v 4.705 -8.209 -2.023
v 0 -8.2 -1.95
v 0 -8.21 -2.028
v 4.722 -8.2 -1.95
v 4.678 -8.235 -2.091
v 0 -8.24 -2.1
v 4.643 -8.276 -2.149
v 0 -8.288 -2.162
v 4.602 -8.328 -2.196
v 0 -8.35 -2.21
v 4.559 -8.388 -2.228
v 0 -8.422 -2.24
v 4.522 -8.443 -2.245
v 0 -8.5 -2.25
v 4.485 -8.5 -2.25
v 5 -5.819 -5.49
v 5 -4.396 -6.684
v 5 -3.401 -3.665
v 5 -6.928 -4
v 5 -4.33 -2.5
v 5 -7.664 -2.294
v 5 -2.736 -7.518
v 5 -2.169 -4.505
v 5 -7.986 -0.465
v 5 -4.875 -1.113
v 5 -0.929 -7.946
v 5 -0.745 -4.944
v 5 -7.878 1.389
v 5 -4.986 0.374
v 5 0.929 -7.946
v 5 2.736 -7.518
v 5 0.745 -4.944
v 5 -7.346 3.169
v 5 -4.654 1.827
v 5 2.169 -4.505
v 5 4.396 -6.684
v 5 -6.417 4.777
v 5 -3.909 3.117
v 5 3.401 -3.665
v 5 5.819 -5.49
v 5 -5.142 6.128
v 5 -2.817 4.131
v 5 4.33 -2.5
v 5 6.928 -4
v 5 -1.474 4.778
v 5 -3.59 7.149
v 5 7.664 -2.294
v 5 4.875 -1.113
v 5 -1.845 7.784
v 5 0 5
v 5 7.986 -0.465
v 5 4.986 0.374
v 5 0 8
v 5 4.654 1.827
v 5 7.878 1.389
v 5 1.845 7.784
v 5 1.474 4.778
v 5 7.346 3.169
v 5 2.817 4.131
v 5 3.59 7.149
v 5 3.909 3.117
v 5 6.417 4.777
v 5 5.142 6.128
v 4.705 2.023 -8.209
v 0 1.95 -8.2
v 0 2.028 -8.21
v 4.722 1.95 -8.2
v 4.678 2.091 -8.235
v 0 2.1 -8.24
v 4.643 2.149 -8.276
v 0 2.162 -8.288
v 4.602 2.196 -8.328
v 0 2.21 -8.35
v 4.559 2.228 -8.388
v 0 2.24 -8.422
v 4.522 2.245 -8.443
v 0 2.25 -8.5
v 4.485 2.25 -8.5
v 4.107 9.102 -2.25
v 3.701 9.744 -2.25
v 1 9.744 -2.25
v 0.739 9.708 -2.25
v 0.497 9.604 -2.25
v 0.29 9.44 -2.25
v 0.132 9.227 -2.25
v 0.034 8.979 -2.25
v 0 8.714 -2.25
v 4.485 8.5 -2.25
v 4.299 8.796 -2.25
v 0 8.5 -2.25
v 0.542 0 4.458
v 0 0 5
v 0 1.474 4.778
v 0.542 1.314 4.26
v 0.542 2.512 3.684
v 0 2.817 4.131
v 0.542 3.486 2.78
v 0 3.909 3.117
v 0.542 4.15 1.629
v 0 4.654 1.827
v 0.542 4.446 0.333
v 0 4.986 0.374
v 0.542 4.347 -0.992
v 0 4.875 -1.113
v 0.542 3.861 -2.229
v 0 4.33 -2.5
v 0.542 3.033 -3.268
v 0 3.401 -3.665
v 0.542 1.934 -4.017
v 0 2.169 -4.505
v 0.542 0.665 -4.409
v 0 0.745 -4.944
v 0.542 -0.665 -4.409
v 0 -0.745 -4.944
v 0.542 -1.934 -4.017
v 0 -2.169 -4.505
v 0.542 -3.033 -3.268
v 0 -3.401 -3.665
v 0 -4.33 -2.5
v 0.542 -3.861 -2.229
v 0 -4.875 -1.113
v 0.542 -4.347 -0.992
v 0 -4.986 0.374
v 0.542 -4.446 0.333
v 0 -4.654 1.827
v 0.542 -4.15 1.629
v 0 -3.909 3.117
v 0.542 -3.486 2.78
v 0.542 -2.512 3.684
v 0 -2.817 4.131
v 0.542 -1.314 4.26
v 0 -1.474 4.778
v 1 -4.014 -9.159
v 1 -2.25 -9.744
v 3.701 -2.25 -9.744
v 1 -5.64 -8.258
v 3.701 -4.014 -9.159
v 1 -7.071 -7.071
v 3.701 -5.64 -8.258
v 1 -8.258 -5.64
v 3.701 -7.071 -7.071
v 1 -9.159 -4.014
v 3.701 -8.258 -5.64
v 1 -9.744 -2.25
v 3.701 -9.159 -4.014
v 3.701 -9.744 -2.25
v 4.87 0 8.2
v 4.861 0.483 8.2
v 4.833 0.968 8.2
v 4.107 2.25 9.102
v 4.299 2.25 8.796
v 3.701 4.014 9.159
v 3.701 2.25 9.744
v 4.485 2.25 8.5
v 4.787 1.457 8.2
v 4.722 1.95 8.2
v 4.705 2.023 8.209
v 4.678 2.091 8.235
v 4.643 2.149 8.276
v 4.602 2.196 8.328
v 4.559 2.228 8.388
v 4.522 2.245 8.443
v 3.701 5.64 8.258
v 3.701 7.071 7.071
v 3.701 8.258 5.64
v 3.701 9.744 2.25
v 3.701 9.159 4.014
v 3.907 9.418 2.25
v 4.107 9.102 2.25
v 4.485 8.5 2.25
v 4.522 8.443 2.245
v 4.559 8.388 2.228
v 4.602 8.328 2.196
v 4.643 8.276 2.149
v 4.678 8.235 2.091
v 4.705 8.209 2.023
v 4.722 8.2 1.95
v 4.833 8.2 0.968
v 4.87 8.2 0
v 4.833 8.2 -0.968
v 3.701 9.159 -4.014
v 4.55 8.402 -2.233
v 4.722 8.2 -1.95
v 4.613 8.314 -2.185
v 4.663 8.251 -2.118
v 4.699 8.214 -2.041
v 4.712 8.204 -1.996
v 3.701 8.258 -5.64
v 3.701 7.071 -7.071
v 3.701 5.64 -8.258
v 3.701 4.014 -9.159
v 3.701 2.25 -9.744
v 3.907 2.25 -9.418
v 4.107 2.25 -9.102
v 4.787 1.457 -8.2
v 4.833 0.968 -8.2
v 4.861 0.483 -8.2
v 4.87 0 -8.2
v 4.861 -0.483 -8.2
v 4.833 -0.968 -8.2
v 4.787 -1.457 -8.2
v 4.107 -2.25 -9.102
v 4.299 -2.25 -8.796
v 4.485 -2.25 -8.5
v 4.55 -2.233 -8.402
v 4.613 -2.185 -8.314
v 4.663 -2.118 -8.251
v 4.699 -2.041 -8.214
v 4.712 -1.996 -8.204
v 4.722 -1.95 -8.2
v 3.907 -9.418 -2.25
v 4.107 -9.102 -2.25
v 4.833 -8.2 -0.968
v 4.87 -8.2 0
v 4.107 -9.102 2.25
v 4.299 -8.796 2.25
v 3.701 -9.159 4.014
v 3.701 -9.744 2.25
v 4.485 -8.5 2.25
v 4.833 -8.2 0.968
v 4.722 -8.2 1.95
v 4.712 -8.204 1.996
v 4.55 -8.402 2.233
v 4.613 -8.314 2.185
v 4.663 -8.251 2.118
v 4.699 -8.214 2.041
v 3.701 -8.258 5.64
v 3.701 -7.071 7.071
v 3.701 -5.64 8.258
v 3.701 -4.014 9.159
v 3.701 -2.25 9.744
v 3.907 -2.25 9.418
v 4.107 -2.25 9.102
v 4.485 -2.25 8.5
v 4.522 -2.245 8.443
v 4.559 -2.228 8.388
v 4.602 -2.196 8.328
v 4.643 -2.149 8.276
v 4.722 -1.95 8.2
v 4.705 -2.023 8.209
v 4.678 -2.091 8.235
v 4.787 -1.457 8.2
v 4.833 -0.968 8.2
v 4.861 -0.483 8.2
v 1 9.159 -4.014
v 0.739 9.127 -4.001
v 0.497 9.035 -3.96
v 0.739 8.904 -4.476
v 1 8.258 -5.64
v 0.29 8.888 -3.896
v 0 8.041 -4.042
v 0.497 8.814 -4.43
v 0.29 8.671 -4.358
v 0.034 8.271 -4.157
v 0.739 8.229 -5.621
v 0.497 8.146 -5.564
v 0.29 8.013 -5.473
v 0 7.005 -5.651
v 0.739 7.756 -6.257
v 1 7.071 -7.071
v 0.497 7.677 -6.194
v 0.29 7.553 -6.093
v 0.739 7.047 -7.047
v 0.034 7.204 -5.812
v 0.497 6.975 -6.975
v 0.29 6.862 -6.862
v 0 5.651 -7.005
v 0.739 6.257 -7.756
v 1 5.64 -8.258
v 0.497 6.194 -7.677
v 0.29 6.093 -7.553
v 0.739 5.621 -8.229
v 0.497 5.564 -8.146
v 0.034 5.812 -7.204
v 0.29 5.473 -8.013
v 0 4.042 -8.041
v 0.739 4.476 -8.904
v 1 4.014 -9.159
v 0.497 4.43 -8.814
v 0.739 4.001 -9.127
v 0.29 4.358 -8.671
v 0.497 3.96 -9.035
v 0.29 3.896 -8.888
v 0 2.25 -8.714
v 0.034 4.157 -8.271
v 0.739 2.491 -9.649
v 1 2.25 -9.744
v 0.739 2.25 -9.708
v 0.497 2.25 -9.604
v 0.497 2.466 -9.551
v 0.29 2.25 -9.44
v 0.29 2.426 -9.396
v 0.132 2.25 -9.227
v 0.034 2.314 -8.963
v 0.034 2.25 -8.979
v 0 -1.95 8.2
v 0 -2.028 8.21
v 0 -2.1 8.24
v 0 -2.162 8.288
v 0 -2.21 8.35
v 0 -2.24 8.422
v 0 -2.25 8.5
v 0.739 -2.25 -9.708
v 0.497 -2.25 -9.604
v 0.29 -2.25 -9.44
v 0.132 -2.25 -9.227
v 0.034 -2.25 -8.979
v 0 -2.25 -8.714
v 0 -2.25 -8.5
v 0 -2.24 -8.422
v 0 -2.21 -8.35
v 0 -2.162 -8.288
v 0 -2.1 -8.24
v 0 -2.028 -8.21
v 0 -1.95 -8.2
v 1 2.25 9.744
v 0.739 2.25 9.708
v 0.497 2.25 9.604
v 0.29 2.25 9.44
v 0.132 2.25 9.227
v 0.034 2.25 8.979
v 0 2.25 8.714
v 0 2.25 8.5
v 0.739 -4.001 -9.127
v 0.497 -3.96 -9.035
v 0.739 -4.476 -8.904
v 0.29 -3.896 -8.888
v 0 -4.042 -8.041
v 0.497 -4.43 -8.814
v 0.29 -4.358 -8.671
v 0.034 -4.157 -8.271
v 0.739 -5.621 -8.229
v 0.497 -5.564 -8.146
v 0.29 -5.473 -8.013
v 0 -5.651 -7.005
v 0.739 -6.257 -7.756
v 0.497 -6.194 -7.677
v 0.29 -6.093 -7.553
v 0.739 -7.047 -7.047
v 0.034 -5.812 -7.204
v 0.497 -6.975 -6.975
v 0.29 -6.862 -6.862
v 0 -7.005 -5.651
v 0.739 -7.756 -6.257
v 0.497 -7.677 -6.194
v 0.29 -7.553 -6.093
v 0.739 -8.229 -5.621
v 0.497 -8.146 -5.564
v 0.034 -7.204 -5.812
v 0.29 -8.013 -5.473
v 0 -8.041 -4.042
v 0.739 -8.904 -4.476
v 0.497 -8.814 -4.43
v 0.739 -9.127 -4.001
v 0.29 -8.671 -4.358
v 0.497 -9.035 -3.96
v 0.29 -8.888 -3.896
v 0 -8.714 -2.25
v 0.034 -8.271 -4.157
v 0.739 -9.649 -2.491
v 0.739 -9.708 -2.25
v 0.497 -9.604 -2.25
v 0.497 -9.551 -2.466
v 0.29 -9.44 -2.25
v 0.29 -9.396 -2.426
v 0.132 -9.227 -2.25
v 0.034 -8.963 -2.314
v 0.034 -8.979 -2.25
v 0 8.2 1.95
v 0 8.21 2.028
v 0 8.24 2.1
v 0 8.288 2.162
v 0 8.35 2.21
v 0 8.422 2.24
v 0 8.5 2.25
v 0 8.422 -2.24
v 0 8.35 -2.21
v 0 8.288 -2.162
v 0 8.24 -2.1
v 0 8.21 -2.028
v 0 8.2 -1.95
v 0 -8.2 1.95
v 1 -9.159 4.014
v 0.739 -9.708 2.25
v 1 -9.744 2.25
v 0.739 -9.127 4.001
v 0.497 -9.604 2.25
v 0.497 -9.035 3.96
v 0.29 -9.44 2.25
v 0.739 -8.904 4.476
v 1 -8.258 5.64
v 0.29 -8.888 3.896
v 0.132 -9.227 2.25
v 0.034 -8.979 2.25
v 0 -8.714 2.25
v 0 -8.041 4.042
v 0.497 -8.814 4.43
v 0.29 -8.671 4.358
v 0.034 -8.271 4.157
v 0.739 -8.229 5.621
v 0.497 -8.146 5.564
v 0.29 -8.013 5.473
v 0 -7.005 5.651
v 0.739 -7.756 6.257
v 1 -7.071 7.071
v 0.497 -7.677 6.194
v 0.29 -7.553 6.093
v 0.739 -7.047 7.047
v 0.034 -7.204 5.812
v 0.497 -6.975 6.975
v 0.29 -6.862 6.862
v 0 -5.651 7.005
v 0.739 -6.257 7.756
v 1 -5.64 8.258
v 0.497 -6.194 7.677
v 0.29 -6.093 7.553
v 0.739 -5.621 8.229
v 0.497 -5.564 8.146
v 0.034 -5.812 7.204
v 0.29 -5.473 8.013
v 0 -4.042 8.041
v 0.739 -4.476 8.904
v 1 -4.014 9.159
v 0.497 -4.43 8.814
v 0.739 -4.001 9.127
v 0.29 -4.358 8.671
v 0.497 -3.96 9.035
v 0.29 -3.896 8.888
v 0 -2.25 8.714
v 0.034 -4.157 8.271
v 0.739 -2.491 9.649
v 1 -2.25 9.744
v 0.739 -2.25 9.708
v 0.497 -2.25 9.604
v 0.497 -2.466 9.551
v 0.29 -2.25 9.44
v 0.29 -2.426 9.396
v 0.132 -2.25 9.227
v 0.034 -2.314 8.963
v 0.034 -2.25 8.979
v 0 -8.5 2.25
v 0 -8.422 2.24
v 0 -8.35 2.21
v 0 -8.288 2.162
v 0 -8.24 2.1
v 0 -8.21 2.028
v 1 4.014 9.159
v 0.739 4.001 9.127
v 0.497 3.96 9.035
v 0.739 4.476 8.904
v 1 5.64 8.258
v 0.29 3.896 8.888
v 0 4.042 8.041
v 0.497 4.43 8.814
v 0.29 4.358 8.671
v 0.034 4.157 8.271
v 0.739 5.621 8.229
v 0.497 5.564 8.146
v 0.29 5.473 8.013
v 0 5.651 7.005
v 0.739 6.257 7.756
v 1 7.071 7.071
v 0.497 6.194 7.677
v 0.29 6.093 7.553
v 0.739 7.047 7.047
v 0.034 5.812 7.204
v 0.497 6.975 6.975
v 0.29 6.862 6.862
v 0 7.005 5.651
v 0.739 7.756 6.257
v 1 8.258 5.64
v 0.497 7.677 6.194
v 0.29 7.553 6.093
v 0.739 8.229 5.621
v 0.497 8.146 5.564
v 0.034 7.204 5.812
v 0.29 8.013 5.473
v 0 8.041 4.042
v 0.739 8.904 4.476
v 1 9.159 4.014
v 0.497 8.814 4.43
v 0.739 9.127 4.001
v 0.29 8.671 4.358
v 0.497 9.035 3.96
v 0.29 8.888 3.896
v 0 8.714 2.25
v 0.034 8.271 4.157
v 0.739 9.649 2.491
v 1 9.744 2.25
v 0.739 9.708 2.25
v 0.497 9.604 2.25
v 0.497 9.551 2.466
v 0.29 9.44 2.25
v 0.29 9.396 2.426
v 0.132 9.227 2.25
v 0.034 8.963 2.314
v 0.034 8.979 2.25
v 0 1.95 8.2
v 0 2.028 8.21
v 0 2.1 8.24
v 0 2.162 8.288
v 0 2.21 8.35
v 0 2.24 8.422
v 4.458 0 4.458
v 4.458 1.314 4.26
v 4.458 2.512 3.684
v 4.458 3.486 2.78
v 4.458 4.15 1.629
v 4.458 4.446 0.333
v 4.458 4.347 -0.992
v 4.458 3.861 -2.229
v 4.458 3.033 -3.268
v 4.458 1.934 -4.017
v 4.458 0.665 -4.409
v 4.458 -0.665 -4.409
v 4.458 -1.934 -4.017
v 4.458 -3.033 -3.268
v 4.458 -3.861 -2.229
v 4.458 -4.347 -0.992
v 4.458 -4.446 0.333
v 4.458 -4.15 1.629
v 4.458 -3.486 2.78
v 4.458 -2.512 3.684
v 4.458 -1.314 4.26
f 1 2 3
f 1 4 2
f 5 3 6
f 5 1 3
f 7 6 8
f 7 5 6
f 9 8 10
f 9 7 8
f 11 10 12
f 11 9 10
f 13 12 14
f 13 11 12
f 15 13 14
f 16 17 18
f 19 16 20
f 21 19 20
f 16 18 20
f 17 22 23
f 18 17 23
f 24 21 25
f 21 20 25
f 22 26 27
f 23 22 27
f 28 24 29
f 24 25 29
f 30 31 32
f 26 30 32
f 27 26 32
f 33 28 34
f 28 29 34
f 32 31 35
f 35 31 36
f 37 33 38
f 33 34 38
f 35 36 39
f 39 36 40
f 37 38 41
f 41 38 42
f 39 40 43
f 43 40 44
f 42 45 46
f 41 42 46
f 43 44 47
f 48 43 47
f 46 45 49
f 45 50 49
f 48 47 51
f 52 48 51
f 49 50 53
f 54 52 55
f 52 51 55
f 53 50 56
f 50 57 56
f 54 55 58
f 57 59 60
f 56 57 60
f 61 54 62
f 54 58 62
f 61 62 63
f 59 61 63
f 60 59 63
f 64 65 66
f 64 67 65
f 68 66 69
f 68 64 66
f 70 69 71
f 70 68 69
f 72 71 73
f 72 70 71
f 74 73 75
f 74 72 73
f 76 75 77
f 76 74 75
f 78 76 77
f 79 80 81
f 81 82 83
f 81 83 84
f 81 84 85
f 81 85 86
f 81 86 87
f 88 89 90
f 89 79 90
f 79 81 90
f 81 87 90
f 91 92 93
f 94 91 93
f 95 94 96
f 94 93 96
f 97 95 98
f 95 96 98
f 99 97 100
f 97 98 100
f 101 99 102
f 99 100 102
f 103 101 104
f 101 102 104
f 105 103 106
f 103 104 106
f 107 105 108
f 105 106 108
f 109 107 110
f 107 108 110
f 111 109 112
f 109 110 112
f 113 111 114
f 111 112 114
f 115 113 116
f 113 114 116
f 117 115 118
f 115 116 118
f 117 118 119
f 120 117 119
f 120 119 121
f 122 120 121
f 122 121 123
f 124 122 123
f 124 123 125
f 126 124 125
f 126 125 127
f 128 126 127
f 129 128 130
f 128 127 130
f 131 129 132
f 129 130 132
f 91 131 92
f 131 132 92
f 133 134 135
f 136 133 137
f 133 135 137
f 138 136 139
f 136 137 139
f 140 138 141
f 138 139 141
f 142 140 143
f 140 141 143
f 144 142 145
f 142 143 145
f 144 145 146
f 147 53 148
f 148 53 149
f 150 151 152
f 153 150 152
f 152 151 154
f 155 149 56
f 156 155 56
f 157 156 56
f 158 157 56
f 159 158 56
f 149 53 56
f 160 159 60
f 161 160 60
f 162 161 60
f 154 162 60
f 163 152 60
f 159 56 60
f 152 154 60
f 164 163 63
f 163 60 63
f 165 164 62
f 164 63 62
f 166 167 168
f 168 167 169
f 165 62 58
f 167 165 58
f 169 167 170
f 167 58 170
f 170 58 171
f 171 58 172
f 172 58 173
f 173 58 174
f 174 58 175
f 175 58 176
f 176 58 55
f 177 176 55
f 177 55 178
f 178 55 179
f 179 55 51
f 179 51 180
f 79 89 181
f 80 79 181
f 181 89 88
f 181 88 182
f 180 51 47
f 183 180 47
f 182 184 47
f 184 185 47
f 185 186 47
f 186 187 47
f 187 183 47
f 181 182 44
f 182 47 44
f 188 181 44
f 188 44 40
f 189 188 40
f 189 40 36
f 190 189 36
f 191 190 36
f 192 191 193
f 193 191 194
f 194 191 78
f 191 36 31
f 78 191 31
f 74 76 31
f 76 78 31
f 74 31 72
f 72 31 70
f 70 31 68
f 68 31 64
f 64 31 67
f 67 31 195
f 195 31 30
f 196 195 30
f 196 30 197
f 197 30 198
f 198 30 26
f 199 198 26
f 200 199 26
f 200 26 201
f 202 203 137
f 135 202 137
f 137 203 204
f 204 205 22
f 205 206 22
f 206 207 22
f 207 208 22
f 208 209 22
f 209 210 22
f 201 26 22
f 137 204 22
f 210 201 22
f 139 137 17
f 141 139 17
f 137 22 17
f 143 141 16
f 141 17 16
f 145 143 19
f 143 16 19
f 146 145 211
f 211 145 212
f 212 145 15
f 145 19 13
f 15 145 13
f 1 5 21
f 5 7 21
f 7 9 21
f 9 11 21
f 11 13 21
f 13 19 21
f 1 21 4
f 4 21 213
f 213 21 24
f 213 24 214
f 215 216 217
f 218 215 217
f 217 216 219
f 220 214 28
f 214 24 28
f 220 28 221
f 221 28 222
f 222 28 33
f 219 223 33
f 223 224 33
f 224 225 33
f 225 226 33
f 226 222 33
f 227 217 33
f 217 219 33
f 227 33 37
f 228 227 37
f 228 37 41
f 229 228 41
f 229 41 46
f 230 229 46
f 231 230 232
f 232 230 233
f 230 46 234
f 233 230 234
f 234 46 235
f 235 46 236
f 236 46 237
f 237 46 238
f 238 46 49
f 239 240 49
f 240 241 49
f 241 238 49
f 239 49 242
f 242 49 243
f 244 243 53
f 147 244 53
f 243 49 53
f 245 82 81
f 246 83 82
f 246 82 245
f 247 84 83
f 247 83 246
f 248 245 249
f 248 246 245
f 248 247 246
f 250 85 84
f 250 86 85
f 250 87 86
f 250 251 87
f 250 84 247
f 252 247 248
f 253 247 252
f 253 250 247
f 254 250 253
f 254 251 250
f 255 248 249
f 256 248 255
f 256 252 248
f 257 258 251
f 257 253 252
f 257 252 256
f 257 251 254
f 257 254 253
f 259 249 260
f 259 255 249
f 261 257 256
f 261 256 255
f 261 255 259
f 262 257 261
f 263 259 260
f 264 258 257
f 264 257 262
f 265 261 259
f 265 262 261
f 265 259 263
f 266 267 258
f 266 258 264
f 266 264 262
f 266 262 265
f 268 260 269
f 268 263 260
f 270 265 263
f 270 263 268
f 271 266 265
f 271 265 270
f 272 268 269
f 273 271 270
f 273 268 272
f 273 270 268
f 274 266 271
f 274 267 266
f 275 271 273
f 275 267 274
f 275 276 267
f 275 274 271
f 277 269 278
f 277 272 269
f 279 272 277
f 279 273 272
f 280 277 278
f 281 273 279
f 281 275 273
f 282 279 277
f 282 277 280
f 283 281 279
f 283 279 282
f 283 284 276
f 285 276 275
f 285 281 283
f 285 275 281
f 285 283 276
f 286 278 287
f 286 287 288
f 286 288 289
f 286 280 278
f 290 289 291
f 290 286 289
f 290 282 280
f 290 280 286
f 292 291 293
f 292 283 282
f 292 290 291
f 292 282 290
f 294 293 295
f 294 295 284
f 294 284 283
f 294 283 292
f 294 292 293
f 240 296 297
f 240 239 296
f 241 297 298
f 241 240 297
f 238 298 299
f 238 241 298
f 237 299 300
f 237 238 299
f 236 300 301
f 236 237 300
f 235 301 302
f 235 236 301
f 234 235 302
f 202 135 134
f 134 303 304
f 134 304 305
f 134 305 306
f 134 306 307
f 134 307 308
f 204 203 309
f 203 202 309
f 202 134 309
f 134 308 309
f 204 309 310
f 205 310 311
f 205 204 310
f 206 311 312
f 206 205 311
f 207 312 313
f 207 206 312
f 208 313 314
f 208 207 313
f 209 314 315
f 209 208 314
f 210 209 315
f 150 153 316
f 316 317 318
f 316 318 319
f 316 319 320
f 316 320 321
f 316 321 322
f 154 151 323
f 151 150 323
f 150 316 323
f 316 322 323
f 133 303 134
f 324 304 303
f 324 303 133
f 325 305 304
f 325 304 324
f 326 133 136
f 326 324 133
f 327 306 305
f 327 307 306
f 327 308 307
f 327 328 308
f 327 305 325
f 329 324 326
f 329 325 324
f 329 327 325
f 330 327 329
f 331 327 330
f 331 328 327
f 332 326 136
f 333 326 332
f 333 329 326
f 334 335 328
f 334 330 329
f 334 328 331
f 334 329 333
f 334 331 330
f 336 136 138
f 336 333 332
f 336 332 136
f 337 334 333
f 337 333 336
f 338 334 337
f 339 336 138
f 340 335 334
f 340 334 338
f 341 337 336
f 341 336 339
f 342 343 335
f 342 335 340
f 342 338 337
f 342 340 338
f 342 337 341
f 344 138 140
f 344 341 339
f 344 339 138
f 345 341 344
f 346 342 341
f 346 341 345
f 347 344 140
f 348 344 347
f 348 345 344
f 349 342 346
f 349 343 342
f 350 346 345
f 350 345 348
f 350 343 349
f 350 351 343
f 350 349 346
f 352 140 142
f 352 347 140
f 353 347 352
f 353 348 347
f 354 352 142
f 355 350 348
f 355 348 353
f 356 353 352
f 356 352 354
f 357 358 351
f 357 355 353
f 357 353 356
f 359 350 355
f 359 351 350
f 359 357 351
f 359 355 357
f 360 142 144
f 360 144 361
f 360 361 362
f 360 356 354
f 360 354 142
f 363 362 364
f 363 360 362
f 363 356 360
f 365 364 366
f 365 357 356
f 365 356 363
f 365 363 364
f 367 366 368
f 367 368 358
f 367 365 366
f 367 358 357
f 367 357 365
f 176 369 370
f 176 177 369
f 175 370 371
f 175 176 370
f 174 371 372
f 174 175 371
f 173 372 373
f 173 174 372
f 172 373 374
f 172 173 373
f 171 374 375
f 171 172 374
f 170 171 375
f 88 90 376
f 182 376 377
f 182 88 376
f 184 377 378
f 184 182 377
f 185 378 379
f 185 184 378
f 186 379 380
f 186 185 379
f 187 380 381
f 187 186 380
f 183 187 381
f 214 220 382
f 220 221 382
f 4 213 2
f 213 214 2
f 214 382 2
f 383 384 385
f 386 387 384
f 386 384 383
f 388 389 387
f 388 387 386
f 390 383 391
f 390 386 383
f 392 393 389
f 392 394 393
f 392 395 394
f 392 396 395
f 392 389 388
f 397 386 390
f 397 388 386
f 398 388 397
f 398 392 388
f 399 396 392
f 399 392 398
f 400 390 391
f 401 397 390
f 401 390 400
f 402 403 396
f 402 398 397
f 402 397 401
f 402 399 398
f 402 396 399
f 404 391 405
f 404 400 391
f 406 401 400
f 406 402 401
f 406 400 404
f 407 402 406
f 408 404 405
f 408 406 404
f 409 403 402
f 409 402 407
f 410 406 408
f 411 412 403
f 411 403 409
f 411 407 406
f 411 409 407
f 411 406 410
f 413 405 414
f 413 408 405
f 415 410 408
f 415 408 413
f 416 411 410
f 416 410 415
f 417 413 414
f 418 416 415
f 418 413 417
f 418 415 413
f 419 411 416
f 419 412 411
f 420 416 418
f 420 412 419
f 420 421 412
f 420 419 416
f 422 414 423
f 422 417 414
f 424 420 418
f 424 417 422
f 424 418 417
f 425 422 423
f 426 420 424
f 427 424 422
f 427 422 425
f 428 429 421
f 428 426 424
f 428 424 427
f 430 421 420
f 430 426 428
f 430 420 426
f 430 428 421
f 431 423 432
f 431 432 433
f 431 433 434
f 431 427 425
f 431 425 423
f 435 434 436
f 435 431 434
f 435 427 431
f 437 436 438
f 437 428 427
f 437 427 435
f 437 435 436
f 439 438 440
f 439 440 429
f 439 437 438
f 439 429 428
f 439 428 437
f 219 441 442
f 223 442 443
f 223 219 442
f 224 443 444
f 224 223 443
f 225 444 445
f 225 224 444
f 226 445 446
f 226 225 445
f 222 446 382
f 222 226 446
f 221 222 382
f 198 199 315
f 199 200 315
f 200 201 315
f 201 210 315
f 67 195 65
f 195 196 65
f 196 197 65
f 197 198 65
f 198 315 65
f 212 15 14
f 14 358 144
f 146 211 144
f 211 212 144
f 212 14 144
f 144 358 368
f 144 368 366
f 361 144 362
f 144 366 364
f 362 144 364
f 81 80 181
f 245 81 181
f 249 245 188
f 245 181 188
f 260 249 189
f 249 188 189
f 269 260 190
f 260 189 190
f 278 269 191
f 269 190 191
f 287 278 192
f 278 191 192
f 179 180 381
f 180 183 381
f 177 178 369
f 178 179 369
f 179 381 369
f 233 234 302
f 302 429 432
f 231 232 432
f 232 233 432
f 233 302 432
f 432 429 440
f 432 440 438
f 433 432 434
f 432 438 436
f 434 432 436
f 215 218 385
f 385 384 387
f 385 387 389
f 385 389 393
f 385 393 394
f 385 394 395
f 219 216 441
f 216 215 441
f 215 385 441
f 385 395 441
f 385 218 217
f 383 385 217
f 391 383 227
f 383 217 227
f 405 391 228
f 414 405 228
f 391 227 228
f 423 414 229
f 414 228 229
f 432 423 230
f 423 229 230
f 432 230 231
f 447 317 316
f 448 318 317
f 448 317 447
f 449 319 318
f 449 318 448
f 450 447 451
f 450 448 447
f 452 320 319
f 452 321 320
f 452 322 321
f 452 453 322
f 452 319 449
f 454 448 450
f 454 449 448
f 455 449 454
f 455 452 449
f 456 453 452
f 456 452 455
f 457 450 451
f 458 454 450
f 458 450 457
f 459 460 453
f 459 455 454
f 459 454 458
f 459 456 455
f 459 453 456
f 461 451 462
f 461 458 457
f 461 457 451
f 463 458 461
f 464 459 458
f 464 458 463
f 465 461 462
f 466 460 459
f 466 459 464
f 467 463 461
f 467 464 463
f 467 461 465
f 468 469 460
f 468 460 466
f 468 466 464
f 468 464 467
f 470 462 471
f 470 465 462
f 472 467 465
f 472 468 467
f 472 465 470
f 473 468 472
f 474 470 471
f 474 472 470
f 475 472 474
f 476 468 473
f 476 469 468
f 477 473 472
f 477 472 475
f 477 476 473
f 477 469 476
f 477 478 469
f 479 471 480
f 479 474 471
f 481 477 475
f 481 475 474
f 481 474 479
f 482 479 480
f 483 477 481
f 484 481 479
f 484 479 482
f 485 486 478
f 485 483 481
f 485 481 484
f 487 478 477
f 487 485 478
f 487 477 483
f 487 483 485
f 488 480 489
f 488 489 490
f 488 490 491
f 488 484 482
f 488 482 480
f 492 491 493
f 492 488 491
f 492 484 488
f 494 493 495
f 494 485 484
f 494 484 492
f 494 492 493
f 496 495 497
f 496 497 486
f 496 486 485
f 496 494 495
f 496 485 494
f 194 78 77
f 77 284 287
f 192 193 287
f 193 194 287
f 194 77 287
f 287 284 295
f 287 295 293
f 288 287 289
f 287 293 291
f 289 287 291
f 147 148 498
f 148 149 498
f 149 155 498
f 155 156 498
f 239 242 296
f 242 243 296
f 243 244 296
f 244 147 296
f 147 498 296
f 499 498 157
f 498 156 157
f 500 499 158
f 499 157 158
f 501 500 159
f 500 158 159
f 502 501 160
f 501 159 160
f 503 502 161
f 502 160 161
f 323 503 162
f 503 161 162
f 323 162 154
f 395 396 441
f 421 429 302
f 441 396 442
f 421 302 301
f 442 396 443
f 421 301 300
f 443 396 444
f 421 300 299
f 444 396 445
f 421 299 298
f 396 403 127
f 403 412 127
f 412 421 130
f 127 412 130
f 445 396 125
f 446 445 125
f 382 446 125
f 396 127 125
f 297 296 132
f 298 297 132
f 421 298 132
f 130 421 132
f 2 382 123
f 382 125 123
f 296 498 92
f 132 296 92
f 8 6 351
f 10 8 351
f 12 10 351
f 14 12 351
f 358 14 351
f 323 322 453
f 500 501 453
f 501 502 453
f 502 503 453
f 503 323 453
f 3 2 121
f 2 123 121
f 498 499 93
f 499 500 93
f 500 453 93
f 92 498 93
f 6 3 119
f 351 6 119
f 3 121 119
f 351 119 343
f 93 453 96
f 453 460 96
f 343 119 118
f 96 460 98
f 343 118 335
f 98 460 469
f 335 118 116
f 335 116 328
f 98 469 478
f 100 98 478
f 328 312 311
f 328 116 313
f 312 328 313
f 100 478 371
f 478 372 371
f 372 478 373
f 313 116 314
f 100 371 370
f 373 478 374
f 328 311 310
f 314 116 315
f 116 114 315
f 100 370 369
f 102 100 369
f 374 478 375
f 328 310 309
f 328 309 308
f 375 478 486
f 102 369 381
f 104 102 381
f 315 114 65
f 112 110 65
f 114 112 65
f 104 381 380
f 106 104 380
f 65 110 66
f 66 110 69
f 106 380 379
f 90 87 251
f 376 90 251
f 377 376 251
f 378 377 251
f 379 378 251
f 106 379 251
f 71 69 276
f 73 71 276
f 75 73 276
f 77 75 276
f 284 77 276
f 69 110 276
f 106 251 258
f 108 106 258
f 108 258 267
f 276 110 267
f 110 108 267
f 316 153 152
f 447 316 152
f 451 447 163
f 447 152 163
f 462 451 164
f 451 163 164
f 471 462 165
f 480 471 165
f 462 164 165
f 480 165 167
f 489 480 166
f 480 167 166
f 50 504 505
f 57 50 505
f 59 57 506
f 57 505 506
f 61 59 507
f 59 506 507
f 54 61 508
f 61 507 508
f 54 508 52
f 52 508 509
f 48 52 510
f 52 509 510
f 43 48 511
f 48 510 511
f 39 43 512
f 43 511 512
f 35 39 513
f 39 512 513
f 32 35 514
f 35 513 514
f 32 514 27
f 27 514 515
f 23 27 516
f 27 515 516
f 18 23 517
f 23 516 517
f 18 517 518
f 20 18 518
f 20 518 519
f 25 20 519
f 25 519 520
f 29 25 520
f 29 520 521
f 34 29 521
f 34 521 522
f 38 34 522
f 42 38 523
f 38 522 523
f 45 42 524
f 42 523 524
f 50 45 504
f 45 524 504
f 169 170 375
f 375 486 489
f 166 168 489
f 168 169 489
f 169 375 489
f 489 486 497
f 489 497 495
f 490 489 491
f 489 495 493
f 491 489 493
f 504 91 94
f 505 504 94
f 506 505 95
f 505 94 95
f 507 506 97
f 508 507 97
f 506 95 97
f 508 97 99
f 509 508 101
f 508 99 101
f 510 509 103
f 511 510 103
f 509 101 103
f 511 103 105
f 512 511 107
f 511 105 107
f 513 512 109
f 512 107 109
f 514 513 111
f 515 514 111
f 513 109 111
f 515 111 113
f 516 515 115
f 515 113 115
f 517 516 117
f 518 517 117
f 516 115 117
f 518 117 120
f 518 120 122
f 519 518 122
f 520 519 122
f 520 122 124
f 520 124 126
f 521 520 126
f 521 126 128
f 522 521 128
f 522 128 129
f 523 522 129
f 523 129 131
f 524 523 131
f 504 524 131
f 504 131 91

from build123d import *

# Parameters (mm, degrees)
CUT_EXTRUDE1_REACH   = 17
CUT_EXTRUDE2_REACH   = 17
CUT_EXTRUDE3_REACH   = 17
CUT_EXTRUDE4_REACH   = 16.83
M8_CLEARANCE_HOLE1_D = 8.917
CHAMFER1_SIZE        = 0.5415
FILLET1_R            = 0.3
FILLET2_R            = 1


with BuildPart() as part:
    # Sketch1 → Revolve1 (revolve)
    with BuildSketch(Plane(origin=(0, 0, 0), x_dir=(-1, 0, 0), z_dir=(0, 0, -1)), mode=Mode.PRIVATE) as revolve1_sk:
        Polygon((-5, 8), (-5, 0), (0, 0), (0, 10), (-3.701184814, 10), align=None)
    revolve(revolve1_sk.sketch.rotate(Axis((5, 0, 0), (-1, 0, 0)), 270), axis=Axis((5, 0, 0), (-1, 0, 0)))

    # Cut-Extrude1: up to this cone (the profile starts inside it)
    cut_extrude1_end = Plane(origin=(0, 0, 0), z_dir=(-1, 0, 0)).offset(-10.195259746) * Cone(1.54e-06, 66.821801925, 43.394584565, align=(Align.CENTER, Align.CENTER, Align.MIN), mode=Mode.PRIVATE)
    # Sketch2 → Cut-Extrude1 (cut, up to the surface)
    with BuildSketch(Plane.ZY, mode=Mode.PRIVATE) as cut_extrude1_sk1:
        with BuildLine():
            Line((9.743587635, 2.25), (8.2, 2.25))
            Line((8.2, 2.25), (8.2, -2.25))
            Line((8.2, -2.25), (9.743587635, -2.25))
            ThreePointArc((9.743587635, -2.25), (10, 0), (9.743587635, 2.25))
        make_face()
    cut_extrude1_tool1 = extrude(cut_extrude1_sk1.sketch, amount=-CUT_EXTRUDE1_REACH, mode=Mode.PRIVATE) & cut_extrude1_end
    add(cut_extrude1_tool1.solids().sort_by_distance((0, 0, 9.059184))[0], mode=Mode.SUBTRACT)

    # Cut-Extrude2: up to this cone (the profile starts inside it)
    cut_extrude2_end = Plane(origin=(0, 0, 0), z_dir=(-1, 0, 0)).offset(-10.195259746) * Cone(1.54e-06, 66.821801925, 43.394584565, align=(Align.CENTER, Align.CENTER, Align.MIN), mode=Mode.PRIVATE)
    # Sketch3 → Cut-Extrude2 (cut, up to the surface)
    with BuildSketch(Plane.ZY, mode=Mode.PRIVATE) as cut_extrude2_sk1:
        with BuildLine():
            Line((2.25, -9.743587635), (2.25, -8.2))
            Line((2.25, -8.2), (-2.25, -8.2))
            Line((-2.25, -8.2), (-2.25, -9.743587635))
            ThreePointArc((-2.25, -9.743587635), (0, -10), (2.25, -9.743587635))
        make_face()
    cut_extrude2_tool1 = extrude(cut_extrude2_sk1.sketch, amount=-CUT_EXTRUDE2_REACH, mode=Mode.PRIVATE) & cut_extrude2_end
    add(cut_extrude2_tool1.solids().sort_by_distance((0, -9.059184, 0))[0], mode=Mode.SUBTRACT)

    # Cut-Extrude3: up to this cone (the profile starts inside it)
    cut_extrude3_end = Plane(origin=(0, 0, 0), z_dir=(-1, 0, 0)).offset(-10.195259746) * Cone(1.54e-06, 66.821801925, 43.394584565, align=(Align.CENTER, Align.CENTER, Align.MIN), mode=Mode.PRIVATE)
    # Sketch4 → Cut-Extrude3 (cut, up to the surface)
    with BuildSketch(Plane.ZY, mode=Mode.PRIVATE) as cut_extrude3_sk1:
        with BuildLine():
            Line((-9.743587635, -2.25), (-8.2, -2.25))
            Line((-8.2, -2.25), (-8.2, 2.25))
            Line((-8.2, 2.25), (-9.743587635, 2.25))
            ThreePointArc((-9.743587635, 2.25), (-10, 0), (-9.743587635, -2.25))
        make_face()
    cut_extrude3_tool1 = extrude(cut_extrude3_sk1.sketch, amount=-CUT_EXTRUDE3_REACH, mode=Mode.PRIVATE) & cut_extrude3_end
    add(cut_extrude3_tool1.solids().sort_by_distance((0, 0, -9.059184))[0], mode=Mode.SUBTRACT)

    # Cut-Extrude4: up to this cone (the profile starts inside it)
    cut_extrude4_end = Plane(origin=(0, 0, 0), z_dir=(-1, 0, 0)).offset(-10.195259746) * Cone(1.54e-06, 66.560024881, 43.224584565, align=(Align.CENTER, Align.CENTER, Align.MIN), mode=Mode.PRIVATE)
    # Sketch5 → Cut-Extrude4 (cut, up to the surface)
    with BuildSketch(Plane.ZY, mode=Mode.PRIVATE) as cut_extrude4_sk1:
        with BuildLine():
            Line((-2.25, 9.743587635), (-2.25, 8.2))
            Line((-2.25, 8.2), (2.25, 8.2))
            Line((2.25, 8.2), (2.25, 9.743587635))
            ThreePointArc((2.25, 9.743587635), (0, 10), (-2.25, 9.743587635))
        make_face()
    cut_extrude4_tool1 = extrude(cut_extrude4_sk1.sketch, amount=-CUT_EXTRUDE4_REACH, mode=Mode.PRIVATE) & cut_extrude4_end
    add(cut_extrude4_tool1.solids().sort_by_distance((0, 9.059184, 0))[0], mode=Mode.SUBTRACT)

    # M8 Clearance Hole1 (through all)
    with Locations(Plane(origin=(5, 0, 0), x_dir=(0, 0, -1), z_dir=(1, 0, 0))):
        with Locations((0, 0)):
            Hole(M8_CLEARANCE_HOLE1_D / 2)

    # Chamfer1
    chamfer1_edges = [part.edges().sort_by_distance(p)[0] for p in [
        (5, 0, -4.4585),
        (0, 0, -4.4585),
    ]]
    chamfer(chamfer1_edges, length=CHAMFER1_SIZE)

    # Fillet1
    fillet1_edges = [part.edges().sort_by_distance(p)[0] for p in [
        (2.336645522, 8.2, -2.25),
        (2.336645522, 2.25, 8.2),
        (2.336645522, -8.2, 2.25),
        (2.336645522, -2.25, 8.2),
        (2.336645522, 8.2, 2.25),
        (2.336645522, -8.2, -2.25),
        (2.336645522, 2.25, -8.2),
        (2.336645522, -2.25, -8.2),
    ]]
    fillet(fillet1_edges, radius=FILLET1_R)

    # Fillet2
    fillet2_edges = [part.edges().sort_by_distance(p)[0] for p in [
        (0, -7.071067812, 7.071067812),
        (0, -7.071067812, -7.071067812),
        (0, 7.071067812, 7.071067812),
        (0, 7.071067812, -7.071067812),
    ]]
    fillet(fillet2_edges, radius=FILLET2_R)


solid = part.part
